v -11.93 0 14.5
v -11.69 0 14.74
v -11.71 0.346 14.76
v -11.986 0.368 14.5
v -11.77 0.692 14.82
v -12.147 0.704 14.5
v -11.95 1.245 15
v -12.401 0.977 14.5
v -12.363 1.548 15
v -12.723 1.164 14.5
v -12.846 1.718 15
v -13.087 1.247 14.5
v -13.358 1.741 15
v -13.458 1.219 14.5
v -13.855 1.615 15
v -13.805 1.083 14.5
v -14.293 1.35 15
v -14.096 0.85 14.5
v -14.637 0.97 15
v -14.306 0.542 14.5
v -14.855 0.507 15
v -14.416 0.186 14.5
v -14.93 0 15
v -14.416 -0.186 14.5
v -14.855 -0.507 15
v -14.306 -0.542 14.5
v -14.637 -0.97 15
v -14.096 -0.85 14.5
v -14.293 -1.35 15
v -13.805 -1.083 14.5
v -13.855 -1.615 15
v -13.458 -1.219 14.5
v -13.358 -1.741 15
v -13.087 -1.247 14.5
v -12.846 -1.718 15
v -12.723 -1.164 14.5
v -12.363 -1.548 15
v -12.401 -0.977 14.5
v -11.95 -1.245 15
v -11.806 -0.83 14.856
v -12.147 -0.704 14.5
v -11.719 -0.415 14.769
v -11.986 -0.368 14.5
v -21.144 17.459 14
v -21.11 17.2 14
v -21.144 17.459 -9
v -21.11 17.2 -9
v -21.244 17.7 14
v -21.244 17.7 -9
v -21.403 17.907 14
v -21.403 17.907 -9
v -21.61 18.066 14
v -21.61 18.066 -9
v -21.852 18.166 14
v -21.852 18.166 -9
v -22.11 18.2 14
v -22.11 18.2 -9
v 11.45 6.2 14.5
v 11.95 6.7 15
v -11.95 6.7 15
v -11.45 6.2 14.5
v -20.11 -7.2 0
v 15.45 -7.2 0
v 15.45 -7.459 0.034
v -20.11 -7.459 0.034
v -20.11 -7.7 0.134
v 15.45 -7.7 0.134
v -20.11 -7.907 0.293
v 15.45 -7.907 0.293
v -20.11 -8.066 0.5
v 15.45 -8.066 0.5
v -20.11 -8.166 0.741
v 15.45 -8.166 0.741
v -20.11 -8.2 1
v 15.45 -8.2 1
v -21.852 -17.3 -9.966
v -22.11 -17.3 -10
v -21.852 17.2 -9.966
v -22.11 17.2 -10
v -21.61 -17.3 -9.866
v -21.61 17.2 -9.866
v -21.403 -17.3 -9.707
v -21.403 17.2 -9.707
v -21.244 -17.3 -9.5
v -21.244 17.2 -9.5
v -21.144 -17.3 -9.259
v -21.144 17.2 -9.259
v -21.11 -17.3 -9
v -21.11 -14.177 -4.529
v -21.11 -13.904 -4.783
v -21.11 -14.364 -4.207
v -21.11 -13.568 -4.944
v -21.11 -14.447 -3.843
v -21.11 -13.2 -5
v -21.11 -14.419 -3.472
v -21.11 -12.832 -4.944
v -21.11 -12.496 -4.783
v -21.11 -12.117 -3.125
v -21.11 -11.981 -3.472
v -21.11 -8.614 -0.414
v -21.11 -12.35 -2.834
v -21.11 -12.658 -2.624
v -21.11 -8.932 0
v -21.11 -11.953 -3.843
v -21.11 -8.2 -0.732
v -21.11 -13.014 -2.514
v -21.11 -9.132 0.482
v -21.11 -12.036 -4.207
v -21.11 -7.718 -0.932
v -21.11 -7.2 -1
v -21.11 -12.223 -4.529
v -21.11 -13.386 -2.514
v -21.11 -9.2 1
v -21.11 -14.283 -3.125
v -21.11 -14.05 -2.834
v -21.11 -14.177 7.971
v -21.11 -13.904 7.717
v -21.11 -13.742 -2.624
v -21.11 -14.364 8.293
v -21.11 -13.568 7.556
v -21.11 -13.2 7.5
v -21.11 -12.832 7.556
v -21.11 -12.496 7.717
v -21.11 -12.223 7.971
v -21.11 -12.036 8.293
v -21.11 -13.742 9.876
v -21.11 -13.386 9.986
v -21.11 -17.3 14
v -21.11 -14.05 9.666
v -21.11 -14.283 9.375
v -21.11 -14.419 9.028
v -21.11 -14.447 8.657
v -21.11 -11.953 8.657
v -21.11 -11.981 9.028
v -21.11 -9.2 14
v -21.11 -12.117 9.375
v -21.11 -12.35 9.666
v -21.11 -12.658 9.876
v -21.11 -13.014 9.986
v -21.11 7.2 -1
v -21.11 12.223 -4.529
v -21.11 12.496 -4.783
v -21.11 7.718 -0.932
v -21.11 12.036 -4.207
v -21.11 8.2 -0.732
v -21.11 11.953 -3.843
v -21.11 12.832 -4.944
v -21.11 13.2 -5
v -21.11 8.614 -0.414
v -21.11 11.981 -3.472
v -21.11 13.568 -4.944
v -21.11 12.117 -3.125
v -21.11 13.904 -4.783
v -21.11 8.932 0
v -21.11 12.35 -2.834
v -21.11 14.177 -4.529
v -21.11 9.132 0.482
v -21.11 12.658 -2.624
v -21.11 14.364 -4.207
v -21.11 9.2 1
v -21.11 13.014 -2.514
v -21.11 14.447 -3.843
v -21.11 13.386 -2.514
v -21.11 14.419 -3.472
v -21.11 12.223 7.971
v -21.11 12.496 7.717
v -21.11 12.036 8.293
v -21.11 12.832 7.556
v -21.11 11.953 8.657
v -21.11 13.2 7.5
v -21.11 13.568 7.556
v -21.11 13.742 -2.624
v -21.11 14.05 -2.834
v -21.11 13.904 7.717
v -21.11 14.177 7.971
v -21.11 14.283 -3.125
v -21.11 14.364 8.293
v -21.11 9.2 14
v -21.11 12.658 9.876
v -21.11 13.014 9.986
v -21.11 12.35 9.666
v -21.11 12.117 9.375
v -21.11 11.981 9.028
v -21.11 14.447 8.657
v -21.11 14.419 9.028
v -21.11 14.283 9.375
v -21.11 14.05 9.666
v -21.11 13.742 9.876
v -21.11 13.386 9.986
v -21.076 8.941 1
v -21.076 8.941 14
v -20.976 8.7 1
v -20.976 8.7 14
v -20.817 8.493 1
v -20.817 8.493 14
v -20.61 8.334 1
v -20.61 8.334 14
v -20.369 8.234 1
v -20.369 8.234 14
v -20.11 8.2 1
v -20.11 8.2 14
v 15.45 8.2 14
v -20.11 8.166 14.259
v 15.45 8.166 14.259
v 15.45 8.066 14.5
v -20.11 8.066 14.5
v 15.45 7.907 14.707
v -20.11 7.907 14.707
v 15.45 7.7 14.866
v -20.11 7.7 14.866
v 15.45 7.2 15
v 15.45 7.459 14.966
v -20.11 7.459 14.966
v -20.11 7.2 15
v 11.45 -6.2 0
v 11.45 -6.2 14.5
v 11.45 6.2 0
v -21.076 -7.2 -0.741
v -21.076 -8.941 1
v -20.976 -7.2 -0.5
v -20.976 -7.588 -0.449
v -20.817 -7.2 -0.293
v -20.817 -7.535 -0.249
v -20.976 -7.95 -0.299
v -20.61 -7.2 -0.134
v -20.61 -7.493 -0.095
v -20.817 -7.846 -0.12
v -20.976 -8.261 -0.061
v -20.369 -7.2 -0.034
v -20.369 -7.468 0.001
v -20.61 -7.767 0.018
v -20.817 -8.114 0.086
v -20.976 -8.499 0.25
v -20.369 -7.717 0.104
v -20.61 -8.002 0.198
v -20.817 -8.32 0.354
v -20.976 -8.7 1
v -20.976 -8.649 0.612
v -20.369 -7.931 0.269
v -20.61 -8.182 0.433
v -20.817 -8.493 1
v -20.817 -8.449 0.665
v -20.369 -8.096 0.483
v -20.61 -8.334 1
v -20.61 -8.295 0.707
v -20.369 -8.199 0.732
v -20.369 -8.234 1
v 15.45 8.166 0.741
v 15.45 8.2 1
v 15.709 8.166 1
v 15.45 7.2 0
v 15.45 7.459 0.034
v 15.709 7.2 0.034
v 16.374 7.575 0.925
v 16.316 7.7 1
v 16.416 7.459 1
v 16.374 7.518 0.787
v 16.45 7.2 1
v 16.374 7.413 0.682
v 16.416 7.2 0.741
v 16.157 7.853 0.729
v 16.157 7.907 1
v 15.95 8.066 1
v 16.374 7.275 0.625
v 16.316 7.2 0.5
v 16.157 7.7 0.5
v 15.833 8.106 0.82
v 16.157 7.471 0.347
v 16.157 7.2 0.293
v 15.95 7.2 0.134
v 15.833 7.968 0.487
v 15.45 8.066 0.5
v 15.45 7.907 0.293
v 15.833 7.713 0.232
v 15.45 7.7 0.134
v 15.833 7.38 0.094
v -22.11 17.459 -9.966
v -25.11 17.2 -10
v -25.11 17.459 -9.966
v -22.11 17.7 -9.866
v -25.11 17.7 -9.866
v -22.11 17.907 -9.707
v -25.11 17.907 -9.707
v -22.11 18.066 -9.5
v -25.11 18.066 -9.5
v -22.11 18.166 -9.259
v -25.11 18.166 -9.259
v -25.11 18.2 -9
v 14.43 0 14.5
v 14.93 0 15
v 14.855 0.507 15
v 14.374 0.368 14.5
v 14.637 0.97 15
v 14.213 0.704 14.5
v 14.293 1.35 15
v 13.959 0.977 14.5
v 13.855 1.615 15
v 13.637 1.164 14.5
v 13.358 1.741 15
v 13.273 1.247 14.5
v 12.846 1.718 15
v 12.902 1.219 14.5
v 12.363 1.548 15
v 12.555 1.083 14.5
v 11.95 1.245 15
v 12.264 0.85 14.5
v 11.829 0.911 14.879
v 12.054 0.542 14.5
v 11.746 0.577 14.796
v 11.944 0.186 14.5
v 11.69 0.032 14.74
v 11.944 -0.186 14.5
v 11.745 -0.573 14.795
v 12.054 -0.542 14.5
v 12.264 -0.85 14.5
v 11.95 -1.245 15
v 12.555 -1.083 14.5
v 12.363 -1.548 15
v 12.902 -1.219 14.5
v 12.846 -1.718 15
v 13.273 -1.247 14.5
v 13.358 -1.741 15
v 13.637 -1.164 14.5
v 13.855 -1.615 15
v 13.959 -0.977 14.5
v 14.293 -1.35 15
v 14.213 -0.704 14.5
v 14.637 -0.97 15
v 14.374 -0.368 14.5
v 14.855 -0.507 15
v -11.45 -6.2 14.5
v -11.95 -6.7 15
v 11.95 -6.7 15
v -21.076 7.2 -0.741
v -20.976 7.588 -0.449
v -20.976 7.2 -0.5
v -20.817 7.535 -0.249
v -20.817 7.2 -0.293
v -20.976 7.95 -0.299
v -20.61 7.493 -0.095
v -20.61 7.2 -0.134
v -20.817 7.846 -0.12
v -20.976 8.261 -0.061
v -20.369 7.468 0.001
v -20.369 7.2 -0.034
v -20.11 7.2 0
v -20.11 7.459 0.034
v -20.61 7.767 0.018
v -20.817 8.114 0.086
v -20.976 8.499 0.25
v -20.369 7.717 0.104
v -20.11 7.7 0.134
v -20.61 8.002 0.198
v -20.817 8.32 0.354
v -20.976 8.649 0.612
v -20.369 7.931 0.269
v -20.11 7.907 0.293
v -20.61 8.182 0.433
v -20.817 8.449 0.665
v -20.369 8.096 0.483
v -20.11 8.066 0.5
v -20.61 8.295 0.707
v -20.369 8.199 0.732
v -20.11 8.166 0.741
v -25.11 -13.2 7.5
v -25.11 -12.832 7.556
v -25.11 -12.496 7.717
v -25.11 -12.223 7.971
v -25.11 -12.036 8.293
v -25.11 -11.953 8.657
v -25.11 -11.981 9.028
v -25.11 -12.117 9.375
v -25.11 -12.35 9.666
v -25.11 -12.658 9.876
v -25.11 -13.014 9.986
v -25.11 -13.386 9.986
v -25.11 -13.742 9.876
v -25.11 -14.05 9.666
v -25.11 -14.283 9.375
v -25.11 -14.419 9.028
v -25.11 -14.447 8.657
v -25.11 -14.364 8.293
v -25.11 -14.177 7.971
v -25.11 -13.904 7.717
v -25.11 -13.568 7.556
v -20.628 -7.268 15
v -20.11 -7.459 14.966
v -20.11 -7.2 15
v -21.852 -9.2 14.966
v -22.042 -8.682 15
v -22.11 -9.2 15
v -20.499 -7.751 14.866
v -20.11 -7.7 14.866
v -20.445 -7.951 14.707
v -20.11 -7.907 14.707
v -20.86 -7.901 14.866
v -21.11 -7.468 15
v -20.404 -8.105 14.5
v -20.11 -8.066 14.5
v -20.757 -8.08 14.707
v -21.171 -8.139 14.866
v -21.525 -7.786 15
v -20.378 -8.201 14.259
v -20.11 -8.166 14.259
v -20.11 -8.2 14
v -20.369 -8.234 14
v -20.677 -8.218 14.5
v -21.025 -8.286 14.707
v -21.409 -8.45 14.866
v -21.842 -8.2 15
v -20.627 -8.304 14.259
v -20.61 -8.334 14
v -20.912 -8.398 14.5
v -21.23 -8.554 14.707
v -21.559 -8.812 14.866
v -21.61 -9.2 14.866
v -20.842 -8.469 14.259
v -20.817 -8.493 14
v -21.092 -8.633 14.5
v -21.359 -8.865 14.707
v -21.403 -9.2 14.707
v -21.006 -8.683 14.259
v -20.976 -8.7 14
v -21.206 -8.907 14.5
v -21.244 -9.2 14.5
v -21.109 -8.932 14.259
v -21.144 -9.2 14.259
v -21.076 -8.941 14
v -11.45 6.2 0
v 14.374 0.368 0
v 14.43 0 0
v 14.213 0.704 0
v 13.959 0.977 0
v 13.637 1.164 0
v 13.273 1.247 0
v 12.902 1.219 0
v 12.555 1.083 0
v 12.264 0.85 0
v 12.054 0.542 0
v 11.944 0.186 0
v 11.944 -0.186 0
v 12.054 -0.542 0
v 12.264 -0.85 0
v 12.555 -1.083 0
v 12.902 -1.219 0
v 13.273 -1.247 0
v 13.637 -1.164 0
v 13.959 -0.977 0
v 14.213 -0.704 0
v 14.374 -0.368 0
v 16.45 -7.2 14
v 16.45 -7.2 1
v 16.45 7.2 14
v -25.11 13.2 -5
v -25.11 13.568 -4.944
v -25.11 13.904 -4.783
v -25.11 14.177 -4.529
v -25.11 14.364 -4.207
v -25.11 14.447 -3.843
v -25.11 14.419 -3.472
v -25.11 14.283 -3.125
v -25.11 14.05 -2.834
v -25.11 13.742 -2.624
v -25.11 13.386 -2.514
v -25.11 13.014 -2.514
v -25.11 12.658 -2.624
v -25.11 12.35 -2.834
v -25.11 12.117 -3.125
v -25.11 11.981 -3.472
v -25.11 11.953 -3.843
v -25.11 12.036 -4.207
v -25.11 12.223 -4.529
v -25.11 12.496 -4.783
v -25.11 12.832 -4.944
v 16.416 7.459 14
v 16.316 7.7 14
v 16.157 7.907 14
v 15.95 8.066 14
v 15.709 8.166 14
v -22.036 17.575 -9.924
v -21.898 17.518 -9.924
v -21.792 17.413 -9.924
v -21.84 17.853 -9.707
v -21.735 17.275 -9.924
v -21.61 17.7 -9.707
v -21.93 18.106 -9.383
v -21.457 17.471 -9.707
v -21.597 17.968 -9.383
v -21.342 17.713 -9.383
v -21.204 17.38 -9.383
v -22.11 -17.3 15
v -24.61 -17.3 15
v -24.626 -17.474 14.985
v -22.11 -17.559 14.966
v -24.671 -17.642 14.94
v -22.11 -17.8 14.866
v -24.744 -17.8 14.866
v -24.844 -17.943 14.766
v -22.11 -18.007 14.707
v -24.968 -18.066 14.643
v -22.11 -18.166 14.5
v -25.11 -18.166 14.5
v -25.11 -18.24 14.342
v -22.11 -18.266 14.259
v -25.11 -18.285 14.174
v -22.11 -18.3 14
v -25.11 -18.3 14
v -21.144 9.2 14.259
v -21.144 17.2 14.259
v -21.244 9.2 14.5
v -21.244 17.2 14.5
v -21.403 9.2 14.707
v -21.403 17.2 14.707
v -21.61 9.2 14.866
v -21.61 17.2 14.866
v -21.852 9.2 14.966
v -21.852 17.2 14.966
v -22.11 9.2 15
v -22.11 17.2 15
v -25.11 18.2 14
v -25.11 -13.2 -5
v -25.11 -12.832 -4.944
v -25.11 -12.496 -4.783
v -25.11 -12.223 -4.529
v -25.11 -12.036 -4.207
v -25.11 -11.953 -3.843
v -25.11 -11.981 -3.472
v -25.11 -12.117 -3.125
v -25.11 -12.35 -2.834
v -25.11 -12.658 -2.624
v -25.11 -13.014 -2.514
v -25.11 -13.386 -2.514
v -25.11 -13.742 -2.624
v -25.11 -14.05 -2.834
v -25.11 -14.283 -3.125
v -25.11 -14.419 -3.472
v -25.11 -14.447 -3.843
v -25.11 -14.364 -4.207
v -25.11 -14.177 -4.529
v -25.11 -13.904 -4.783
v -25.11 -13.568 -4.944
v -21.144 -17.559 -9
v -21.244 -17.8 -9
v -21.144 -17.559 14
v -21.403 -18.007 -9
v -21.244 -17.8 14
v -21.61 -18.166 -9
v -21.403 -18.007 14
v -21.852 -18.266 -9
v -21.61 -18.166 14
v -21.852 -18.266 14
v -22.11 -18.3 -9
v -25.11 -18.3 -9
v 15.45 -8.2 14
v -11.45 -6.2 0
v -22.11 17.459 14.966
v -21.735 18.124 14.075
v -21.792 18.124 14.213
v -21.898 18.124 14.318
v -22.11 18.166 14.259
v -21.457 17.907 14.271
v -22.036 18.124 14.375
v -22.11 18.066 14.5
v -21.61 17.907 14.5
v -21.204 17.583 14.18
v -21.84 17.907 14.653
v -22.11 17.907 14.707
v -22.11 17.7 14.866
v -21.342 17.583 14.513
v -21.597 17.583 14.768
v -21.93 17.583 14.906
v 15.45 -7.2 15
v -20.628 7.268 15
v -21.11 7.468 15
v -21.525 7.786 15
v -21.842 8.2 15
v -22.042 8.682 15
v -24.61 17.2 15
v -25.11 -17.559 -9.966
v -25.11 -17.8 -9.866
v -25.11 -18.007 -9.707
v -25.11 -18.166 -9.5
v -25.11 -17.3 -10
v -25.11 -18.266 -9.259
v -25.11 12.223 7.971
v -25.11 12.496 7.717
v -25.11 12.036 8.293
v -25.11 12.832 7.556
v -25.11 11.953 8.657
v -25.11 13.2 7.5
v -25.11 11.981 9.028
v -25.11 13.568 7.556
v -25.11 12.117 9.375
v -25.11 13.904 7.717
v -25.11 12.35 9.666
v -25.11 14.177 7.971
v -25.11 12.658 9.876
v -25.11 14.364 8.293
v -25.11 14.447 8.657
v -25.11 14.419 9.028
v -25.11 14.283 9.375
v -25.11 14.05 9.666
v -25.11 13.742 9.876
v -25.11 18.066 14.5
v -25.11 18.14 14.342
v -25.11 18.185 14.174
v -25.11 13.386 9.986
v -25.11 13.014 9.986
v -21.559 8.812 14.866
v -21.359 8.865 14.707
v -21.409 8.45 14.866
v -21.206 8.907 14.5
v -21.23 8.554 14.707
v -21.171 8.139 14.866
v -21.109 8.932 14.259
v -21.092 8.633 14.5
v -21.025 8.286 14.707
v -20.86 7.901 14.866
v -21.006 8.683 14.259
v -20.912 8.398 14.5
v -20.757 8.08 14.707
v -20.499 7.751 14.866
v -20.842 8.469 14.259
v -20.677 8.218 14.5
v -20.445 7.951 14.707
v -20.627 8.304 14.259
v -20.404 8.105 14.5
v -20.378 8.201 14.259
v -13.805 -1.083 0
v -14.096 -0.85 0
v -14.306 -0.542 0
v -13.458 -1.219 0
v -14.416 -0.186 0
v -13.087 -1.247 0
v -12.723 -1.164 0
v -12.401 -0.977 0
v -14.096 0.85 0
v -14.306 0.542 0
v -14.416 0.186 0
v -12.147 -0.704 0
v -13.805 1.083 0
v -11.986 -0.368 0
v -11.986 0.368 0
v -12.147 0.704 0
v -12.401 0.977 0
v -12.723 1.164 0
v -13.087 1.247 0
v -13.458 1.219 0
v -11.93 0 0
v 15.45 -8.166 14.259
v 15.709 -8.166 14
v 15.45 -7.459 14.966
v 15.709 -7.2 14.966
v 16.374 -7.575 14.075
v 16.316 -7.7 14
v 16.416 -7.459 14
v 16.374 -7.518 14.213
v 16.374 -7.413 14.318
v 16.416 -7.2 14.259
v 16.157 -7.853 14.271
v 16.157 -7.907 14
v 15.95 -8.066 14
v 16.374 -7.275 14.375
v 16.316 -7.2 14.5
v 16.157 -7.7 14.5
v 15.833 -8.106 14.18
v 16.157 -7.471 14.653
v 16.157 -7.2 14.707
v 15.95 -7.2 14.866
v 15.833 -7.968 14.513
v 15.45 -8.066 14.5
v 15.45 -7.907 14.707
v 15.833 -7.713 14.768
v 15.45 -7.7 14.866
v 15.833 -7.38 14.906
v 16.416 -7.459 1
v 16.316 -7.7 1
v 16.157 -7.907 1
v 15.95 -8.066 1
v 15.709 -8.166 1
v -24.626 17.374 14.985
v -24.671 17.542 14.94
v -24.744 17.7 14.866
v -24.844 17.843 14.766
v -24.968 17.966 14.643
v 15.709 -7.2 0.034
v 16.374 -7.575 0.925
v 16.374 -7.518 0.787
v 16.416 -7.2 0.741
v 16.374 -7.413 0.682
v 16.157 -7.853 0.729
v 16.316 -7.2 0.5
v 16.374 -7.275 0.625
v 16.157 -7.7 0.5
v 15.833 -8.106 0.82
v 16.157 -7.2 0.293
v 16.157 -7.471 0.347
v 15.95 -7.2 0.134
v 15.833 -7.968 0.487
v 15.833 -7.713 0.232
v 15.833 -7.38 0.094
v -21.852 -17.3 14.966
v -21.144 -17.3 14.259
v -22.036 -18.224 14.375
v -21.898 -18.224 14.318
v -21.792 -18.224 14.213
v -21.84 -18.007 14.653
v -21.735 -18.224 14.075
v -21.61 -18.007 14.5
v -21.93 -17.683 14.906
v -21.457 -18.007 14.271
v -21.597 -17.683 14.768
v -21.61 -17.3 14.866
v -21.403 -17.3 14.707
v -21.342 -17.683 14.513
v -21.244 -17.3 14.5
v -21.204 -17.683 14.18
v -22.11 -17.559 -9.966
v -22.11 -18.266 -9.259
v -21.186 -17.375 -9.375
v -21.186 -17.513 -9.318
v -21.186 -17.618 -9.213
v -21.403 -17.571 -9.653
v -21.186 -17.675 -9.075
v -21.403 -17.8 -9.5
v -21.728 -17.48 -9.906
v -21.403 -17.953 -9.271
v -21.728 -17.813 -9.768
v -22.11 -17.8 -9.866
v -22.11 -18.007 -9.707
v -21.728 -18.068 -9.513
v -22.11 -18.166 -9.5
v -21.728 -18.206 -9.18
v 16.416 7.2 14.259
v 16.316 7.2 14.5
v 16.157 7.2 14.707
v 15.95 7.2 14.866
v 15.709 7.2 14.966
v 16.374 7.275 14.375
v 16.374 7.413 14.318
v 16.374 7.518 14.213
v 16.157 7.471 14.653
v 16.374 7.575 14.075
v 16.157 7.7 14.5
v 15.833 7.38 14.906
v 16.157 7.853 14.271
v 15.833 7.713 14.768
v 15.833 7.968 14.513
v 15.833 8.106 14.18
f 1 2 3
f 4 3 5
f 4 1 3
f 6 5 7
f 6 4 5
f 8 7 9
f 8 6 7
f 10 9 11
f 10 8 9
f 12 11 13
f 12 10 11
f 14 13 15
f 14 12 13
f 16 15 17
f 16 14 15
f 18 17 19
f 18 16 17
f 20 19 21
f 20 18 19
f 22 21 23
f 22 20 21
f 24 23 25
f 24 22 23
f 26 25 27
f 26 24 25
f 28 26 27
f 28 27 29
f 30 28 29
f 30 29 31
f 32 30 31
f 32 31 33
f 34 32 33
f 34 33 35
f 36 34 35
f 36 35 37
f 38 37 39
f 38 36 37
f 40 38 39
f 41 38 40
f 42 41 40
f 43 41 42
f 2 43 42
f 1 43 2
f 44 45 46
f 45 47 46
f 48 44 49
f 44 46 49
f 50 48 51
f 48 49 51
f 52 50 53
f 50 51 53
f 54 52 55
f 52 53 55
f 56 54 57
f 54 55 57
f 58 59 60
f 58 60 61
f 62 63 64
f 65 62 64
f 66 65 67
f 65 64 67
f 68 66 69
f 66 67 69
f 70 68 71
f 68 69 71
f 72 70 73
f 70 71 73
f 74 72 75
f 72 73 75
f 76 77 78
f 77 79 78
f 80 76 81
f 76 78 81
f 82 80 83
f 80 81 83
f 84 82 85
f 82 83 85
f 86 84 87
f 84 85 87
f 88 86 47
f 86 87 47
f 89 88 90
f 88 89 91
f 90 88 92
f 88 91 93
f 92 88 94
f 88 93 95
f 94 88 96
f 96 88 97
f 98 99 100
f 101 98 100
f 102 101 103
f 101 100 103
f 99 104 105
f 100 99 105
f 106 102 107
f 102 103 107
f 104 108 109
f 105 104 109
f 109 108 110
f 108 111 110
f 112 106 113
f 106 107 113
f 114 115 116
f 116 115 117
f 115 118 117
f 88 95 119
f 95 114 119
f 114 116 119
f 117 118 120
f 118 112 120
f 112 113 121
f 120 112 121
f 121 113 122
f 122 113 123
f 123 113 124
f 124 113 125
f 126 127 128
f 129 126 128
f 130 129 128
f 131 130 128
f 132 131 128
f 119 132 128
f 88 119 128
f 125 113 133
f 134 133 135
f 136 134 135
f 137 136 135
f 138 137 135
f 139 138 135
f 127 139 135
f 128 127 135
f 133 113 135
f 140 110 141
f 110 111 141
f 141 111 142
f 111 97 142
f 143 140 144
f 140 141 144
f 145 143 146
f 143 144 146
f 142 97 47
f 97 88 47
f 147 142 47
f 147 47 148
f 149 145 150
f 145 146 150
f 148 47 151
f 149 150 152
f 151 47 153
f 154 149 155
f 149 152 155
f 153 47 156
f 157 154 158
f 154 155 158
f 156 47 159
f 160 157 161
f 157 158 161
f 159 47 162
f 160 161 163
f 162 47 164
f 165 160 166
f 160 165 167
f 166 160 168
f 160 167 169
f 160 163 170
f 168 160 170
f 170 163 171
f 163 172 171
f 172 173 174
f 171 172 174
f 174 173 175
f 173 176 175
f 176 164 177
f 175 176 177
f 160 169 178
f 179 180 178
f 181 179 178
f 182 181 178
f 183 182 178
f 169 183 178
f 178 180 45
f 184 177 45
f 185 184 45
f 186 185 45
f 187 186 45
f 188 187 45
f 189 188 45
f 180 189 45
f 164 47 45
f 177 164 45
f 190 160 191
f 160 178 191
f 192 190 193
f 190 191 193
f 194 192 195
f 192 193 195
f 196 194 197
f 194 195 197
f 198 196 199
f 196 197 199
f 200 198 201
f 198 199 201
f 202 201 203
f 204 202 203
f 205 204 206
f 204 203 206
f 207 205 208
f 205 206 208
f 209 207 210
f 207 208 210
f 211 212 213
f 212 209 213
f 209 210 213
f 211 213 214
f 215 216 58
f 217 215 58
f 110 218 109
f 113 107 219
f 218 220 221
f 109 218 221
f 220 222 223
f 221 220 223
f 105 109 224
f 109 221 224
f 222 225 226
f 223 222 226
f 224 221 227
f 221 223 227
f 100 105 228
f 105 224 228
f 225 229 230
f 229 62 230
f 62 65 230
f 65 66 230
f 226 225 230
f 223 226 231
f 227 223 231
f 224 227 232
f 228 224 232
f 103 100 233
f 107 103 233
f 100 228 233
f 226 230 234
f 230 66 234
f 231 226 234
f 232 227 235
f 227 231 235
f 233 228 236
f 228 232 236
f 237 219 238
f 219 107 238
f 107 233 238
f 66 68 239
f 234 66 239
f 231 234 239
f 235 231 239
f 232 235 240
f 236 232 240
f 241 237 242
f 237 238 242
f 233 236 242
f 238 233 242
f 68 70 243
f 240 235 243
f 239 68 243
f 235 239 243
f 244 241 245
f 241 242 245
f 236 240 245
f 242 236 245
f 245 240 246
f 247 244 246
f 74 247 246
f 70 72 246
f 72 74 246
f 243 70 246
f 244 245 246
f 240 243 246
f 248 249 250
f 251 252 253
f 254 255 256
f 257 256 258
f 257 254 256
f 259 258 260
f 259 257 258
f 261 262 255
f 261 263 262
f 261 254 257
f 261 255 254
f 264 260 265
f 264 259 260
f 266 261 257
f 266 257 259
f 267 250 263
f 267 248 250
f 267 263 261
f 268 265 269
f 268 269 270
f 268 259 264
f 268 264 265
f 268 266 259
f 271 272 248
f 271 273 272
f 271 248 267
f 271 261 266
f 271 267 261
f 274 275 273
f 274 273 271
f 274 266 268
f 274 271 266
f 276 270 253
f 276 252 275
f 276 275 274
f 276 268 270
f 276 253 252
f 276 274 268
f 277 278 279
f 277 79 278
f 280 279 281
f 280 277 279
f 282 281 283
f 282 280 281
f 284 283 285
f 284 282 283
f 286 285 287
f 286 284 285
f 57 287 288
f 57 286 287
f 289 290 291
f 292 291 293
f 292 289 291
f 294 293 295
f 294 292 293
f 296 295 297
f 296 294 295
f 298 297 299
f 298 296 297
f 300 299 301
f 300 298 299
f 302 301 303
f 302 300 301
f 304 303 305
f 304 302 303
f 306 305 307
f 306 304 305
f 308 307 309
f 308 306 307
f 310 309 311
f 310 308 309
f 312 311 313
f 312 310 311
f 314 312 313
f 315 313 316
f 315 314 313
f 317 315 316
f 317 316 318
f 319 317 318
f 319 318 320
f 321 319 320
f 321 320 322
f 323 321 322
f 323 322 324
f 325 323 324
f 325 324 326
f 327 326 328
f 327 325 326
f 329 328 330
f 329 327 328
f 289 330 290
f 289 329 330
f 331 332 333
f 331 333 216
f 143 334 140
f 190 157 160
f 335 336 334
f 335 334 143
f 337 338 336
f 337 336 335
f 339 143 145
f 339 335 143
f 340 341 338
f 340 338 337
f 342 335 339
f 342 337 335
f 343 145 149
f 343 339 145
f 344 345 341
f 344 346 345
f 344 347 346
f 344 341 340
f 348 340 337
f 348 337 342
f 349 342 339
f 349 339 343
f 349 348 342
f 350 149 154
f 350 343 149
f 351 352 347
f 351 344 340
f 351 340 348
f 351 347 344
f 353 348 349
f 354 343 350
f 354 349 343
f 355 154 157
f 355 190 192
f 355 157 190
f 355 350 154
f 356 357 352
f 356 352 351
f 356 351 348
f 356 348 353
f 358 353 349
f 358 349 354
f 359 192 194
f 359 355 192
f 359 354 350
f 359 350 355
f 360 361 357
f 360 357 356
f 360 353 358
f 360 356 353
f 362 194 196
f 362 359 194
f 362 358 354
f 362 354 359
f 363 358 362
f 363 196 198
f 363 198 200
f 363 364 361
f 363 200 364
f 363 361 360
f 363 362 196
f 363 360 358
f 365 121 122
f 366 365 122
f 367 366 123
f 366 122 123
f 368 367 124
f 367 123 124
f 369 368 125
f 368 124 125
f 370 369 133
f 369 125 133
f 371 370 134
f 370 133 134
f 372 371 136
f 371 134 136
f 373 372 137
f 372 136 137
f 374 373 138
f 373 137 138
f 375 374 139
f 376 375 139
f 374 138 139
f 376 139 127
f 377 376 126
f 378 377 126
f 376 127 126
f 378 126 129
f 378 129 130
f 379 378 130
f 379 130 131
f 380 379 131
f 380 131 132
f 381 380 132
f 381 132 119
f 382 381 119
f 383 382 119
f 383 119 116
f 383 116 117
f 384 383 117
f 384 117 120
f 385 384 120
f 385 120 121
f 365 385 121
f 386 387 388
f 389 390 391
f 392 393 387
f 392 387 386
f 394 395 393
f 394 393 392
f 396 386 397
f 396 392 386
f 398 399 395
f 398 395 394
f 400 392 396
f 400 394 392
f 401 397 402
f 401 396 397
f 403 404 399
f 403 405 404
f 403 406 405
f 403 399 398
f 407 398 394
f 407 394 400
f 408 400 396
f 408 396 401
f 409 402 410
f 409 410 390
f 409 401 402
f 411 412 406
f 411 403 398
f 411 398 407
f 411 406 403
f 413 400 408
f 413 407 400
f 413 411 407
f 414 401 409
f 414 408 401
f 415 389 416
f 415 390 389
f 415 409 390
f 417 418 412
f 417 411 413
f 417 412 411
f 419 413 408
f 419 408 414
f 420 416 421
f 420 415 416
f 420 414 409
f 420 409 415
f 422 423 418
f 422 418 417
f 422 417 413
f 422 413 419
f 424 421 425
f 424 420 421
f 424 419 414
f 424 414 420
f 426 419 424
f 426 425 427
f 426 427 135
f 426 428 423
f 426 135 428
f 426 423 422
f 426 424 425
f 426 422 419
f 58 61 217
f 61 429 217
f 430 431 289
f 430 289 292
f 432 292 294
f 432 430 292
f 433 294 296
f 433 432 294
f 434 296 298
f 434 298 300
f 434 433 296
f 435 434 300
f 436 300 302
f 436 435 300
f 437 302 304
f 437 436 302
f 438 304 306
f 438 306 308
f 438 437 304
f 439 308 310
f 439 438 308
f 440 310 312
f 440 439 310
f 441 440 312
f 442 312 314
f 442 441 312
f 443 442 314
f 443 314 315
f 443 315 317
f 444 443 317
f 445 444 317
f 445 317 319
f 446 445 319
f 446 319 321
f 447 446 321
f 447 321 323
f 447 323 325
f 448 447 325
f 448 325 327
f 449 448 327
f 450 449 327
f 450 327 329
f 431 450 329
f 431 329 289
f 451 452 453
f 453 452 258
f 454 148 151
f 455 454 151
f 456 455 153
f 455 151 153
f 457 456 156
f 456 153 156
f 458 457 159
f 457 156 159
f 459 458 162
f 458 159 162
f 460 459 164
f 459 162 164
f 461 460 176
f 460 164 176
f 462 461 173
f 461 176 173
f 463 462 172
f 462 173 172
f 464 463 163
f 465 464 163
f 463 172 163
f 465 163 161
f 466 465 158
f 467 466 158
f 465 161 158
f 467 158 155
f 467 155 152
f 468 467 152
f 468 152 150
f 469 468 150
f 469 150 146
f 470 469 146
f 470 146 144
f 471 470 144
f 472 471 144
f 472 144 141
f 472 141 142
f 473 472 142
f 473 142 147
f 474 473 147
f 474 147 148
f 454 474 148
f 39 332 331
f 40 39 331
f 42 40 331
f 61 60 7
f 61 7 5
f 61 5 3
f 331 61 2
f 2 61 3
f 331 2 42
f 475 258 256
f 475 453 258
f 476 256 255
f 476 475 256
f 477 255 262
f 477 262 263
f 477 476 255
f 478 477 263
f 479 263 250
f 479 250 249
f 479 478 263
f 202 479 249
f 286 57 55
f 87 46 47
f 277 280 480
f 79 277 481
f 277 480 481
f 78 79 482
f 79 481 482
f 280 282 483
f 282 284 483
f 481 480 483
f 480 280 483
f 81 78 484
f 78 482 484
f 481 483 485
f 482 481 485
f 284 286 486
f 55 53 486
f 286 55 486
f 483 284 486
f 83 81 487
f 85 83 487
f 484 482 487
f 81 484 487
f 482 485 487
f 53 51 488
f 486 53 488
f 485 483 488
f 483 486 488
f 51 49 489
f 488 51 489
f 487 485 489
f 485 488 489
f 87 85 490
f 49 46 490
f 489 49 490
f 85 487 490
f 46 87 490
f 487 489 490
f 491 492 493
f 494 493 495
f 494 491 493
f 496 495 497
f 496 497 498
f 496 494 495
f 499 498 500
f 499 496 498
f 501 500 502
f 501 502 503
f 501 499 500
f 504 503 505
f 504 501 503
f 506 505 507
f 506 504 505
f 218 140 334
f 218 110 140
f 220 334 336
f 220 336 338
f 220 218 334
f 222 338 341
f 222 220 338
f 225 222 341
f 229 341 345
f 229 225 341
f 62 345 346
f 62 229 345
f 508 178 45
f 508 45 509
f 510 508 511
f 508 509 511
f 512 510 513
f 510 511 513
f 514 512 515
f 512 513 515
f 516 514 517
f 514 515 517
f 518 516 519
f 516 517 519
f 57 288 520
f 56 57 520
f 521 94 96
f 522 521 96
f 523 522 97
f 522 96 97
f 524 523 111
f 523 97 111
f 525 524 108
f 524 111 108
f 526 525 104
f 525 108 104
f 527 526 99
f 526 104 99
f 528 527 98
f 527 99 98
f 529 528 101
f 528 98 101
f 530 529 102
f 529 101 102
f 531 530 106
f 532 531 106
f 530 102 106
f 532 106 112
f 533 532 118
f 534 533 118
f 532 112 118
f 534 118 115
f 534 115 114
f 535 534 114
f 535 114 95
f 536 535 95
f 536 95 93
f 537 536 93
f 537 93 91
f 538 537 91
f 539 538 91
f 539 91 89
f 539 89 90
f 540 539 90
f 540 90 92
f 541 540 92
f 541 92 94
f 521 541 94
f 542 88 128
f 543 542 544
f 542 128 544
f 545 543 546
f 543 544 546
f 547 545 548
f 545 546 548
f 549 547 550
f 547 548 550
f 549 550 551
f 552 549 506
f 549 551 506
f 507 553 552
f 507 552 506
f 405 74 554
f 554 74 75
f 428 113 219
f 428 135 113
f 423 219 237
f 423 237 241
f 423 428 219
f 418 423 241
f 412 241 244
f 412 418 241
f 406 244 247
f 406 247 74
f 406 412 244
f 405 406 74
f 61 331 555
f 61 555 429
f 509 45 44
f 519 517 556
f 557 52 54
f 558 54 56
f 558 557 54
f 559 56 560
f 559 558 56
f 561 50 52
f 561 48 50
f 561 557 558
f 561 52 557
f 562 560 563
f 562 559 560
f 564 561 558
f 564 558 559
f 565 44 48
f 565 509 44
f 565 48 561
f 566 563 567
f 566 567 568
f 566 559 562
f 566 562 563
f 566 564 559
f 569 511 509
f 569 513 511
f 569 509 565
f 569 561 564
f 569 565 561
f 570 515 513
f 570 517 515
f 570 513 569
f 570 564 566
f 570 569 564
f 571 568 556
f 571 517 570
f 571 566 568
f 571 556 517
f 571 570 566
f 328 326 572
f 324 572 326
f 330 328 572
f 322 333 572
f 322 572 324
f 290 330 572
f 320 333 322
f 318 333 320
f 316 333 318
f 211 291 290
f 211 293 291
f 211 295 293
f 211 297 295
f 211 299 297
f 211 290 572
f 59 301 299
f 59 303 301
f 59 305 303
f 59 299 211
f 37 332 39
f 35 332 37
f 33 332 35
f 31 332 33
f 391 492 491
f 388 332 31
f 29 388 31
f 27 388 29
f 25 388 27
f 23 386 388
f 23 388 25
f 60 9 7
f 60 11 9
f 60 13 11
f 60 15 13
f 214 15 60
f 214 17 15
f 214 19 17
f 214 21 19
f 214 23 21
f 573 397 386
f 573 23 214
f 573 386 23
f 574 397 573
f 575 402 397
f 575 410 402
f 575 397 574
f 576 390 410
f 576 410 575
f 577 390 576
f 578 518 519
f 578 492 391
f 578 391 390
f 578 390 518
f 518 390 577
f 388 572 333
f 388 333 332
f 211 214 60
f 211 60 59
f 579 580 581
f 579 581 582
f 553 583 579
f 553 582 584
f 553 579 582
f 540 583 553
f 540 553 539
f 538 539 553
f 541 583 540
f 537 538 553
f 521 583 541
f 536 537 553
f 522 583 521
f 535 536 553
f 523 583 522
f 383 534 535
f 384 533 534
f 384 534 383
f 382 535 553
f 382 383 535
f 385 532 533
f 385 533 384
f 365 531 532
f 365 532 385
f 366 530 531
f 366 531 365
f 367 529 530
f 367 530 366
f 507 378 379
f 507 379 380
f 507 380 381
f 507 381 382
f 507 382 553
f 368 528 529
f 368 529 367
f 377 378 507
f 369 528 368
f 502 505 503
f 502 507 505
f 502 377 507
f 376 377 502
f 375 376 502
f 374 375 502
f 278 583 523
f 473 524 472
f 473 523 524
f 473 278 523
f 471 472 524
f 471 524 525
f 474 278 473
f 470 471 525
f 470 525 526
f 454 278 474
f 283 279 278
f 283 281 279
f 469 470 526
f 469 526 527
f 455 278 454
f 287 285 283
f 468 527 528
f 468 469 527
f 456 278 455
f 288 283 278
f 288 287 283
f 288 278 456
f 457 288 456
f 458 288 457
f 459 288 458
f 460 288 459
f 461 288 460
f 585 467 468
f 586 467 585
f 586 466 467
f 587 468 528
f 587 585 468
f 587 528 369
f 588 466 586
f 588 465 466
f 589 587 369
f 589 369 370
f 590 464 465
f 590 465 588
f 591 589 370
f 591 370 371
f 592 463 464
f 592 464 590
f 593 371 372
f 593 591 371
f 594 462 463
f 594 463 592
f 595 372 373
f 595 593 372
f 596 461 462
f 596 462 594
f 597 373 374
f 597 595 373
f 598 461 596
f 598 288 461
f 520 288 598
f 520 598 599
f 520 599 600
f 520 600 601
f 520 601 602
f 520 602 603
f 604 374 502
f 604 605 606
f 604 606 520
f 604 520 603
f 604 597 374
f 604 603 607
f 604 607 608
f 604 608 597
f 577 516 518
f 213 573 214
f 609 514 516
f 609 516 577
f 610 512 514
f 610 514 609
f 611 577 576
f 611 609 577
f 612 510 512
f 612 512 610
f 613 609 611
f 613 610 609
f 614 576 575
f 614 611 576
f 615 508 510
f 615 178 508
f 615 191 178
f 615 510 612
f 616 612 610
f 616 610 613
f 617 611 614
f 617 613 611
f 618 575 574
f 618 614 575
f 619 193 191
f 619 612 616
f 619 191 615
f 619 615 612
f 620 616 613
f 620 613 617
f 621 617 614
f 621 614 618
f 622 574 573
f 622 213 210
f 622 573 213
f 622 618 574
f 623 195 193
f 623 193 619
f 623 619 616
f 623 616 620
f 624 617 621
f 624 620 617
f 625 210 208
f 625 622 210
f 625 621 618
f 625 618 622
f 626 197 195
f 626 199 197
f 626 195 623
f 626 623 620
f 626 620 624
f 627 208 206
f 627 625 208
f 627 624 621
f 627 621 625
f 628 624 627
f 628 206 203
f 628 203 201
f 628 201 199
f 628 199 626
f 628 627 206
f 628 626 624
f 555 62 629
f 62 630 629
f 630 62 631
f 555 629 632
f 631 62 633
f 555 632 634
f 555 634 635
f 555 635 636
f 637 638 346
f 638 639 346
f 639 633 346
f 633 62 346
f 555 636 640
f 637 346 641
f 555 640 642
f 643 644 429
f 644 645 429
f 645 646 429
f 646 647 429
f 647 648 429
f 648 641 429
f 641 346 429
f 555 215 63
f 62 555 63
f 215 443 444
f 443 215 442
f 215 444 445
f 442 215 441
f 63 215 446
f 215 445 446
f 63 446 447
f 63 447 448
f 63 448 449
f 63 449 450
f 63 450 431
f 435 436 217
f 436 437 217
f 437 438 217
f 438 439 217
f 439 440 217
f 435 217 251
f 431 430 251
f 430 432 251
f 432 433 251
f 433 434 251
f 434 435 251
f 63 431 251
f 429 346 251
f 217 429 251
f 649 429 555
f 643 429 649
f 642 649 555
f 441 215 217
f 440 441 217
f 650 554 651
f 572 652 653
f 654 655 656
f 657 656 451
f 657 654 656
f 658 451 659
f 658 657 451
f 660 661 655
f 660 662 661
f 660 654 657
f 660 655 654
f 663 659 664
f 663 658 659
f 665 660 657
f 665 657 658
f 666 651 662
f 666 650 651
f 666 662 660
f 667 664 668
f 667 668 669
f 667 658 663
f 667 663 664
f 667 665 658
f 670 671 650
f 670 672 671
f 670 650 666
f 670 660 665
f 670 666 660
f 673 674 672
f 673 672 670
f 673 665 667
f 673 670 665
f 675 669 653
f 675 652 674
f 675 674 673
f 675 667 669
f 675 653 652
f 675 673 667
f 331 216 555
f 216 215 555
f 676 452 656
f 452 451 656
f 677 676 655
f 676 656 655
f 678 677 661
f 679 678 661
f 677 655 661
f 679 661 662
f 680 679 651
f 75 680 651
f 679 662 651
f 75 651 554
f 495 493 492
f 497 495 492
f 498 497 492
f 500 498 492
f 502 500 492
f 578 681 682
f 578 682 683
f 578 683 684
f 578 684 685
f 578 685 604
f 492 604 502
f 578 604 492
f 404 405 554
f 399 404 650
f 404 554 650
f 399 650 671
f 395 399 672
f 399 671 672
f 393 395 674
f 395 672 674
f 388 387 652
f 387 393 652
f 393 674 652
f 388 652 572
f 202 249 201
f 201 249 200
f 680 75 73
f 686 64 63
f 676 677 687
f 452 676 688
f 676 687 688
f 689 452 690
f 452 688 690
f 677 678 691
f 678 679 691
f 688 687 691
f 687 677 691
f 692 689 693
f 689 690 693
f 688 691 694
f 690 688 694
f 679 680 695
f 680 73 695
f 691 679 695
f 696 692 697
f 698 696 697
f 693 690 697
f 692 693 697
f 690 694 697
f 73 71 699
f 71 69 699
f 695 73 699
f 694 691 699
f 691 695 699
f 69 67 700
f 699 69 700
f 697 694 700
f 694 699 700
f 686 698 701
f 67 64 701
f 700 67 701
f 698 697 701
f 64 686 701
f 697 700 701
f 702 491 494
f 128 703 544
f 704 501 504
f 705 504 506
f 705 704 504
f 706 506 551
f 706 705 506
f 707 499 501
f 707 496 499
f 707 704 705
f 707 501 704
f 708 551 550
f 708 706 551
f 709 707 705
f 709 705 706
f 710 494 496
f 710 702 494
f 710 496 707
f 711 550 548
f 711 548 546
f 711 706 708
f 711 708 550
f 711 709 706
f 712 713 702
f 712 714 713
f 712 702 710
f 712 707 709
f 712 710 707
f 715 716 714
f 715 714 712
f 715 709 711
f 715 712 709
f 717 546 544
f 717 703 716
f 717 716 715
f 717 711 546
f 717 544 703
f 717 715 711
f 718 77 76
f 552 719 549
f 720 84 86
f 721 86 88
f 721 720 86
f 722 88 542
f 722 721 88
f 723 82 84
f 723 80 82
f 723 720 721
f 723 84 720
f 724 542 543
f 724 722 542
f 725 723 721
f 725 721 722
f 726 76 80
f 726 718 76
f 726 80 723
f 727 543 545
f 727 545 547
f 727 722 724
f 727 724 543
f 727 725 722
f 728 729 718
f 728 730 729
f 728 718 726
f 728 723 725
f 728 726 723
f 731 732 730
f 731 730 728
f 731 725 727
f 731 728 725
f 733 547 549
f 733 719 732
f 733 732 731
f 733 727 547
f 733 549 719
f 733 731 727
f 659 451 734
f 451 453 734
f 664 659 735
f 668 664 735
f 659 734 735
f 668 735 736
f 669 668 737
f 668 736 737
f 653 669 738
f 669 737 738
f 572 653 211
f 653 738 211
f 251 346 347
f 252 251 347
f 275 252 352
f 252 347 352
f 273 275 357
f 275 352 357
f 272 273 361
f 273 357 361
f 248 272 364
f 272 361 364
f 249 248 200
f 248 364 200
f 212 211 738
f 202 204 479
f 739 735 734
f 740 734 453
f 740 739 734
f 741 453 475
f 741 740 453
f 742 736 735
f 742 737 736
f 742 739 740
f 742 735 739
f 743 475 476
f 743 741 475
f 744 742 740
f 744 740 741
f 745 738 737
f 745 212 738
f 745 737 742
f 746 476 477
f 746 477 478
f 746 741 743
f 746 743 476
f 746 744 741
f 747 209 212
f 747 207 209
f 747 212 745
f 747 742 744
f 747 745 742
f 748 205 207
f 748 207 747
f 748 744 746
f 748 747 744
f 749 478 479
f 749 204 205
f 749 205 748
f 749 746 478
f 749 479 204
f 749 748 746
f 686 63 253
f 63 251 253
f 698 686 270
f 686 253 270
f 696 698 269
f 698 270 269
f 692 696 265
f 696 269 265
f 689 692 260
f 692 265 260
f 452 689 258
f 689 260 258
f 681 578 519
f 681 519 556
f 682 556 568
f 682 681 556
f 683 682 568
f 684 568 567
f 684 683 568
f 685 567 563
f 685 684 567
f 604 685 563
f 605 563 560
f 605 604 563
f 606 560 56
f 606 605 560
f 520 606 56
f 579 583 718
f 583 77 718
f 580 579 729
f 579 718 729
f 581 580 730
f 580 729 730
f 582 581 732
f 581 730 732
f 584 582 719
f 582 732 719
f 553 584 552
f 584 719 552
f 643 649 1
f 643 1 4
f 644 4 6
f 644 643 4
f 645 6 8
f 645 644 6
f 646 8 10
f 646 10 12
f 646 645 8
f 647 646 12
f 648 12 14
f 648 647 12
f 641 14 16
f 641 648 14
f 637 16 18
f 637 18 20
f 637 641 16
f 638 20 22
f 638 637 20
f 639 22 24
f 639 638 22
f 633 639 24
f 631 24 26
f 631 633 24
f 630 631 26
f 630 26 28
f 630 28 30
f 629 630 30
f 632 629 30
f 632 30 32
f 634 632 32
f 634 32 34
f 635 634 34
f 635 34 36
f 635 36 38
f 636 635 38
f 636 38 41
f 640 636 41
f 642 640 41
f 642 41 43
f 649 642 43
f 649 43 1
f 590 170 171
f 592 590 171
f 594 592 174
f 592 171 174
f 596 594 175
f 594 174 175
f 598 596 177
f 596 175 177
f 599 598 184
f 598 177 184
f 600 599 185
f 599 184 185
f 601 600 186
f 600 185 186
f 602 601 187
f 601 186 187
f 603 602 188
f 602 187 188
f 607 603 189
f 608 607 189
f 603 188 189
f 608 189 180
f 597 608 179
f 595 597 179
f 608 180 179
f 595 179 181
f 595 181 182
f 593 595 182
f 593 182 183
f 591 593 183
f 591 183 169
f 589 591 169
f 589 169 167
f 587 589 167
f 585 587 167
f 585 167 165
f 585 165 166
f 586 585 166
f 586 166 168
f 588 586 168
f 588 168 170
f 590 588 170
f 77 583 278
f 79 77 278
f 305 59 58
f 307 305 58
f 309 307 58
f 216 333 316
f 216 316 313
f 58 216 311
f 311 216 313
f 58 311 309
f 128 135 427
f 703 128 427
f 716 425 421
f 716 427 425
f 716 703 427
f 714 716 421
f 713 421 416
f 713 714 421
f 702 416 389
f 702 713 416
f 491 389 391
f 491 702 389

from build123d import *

# Parameters (mm, degrees)
SKETCH1_R           = 1.25
SKETCH1_W           = 22.9
SKETCH1_H           = 12.4
BOSS_EXTRUDE1_DEPTH = 15
SKETCH4_W           = 25
SKETCH4_H           = 36.5
BOSS_EXTRUDE2_DEPTH = 4
SKETCH3_R           = 1.25
CUT_EXTRUDE1_DEPTH  = 35.502452959
CHAMFER1_SIZE       = 0.5
FILLET1_R           = 1


with BuildPart() as part:
    # Sketch1 → Boss-Extrude1 (new body)
    with BuildSketch(Plane.XY):
        Polygon((16.45, -8.2), (16.45, 8.2), (-21.110341698, 8.2), (-21.110341698, 18.2), (-25.110341698, 18.2), (-25.110341698, -18.2), (-21.110341698, -18.2), (-21.110341698, -8.2), align=None)
        with Locations((13.18, 0)):
            Circle(SKETCH1_R, mode=Mode.SUBTRACT)
        with Locations((-13.18, 0)):
            Circle(SKETCH1_R, mode=Mode.SUBTRACT)
        Rectangle(SKETCH1_W, SKETCH1_H, mode=Mode.SUBTRACT)
    extrude(amount=BOSS_EXTRUDE1_DEPTH)

    # Sketch4 → Boss-Extrude2 (add)
    with BuildSketch(Plane.ZY.offset(25.110341698)):
        with Locations((2.5, -0.05)):
            Rectangle(SKETCH4_W, SKETCH4_H)
    extrude(amount=-BOSS_EXTRUDE2_DEPTH)

    # Sketch3 → Cut-Extrude1 (cut, through all)
    with BuildSketch(Plane(origin=(0, 0, 0), x_dir=(0, 0, -1), z_dir=(1, 0, 0))):
        with Locations((-8.75, 13.2)):
            Circle(SKETCH3_R)
        with Locations((3.75, 13.2)):
            Circle(SKETCH3_R)
        with Locations((3.75, -13.2)):
            Circle(SKETCH3_R)
        with Locations((-8.75, -13.2)):
            Circle(SKETCH3_R)
    extrude(amount=-CUT_EXTRUDE1_DEPTH, mode=Mode.SUBTRACT)

    # Chamfer1
    # the kernel refuses this chamfer: 0.5 mm, written as the material it takes off along each edge
    with BuildSketch(Plane(origin=(-25.110341698, 19.485841494, 15), x_dir=(0.9996219169112968, 0, 0.02749587661058555), z_dir=(0, -1, 0))) as chamfer1_piece_1:
        Polygon((CHAMFER1_SIZE * 0.999621916911, -CHAMFER1_SIZE * 0.0274958766106), (-CHAMFER1_SIZE * 0.0274958766106, -CHAMFER1_SIZE * 0.999621916911), (0, 0), align=None)
    extrude(amount=39.071682988, mode=Mode.SUBTRACT)
    with BuildSketch(Plane(origin=(11.45, -6.2, 15), x_dir=(0.9996219169112968, 0, 0.02749587661058574), z_dir=(0, 1, 0)), Plane(origin=(-11.45, 6.2, 15), x_dir=(-0.9996219169112968, 0, 0.027495876610585647), z_dir=(0, -1, 0))) as chamfer1_piece_2:
        Polygon((CHAMFER1_SIZE * 0.999621916911, CHAMFER1_SIZE * 0.0274958766106), (-CHAMFER1_SIZE * 0.0274958766106, CHAMFER1_SIZE * 0.999621916911), (0, 0), align=None)
    extrude(amount=12.4, mode=Mode.SUBTRACT)
    with BuildSketch(Plane(origin=(11.45, 6.2, 15), x_dir=(0, 0.9996219169112968, 0.027495876610585647), z_dir=(-1, 0, 0)), Plane(origin=(-11.45, -6.2, 15), x_dir=(0, -0.9996219169112968, 0.027495876610585647), z_dir=(1, 0, 0))) as chamfer1_piece_3:
        Polygon((CHAMFER1_SIZE * 0.999621916911, CHAMFER1_SIZE * 0.0274958766106), (-CHAMFER1_SIZE * 0.0274958766106, CHAMFER1_SIZE * 0.999621916911), (0, 0), align=None)
    extrude(amount=22.9, mode=Mode.SUBTRACT)
    with BuildSketch(Plane(origin=(13.18, 0, 15), x_dir=(1, 0, 0), z_dir=(0, -1, 0))) as chamfer1_piece_4:
        Polygon((1.25 + CHAMFER1_SIZE, 0), (1.25, -CHAMFER1_SIZE), (1.25, 0), align=None)
    revolve(axis=Axis((13.18, 0, 15), (0, 0, 1)), mode=Mode.SUBTRACT)
    with BuildSketch(Plane(origin=(-13.18, 0, 15), x_dir=(1, 0, 0), z_dir=(0, -1, 0))) as chamfer1_piece_5:
        Polygon((1.25 + CHAMFER1_SIZE, 0), (1.25, -CHAMFER1_SIZE), (1.25, 0), align=None)
    revolve(axis=Axis((-13.18, 0, 15), (0, 0, 1)), mode=Mode.SUBTRACT)
    with BuildSketch(Plane(origin=(11.45, -7.485841494, 15), x_dir=(0.9996219169112968, 0, 0.027495876610585647), z_dir=(0, 1, 0))) as chamfer1_piece_6a_section:
        Polygon((CHAMFER1_SIZE * 0.999621916911, CHAMFER1_SIZE * 0.0274958766106), (-CHAMFER1_SIZE * 0.0274958766106, CHAMFER1_SIZE * 0.999621916911), (0, 0), align=None)
    chamfer1_piece_6a = extrude(amount=13.685841494, mode=Mode.PRIVATE)
    chamfer1_piece_6a = split(chamfer1_piece_6a, bisect_by=Plane(origin=(11.614896813, -6.2, 14.835103187), z_dir=(0, -1, 0)), keep=Keep.TOP, mode=Mode.PRIVATE)
    with BuildSketch(Plane(origin=(-11.45, -6.2, 15), x_dir=(0, -0.9996219169112968, 0.027495876610585647), z_dir=(1, 0, 0))) as chamfer1_piece_6b_section:
        Polygon((CHAMFER1_SIZE * 0.999621916911, CHAMFER1_SIZE * 0.0274958766106), (-CHAMFER1_SIZE * 0.0274958766106, CHAMFER1_SIZE * 0.999621916911), (0, 0), align=None)
    chamfer1_piece_6b = extrude(amount=24.185841494, mode=Mode.PRIVATE)
    chamfer1_piece_6b = split(chamfer1_piece_6b, bisect_by=Plane(origin=(11.45, -6.364896813, 14.835103187), z_dir=(1, 0, 0)), keep=Keep.TOP, mode=Mode.PRIVATE)
    chamfer1_piece_6 = chamfer1_piece_6a & chamfer1_piece_6b
    add(chamfer1_piece_6, mode=Mode.SUBTRACT)
    with BuildSketch(Plane(origin=(11.45, -6.2, 15), x_dir=(0.9996219169112968, 0, 0.02749587661058574), z_dir=(0, 1, 0))) as chamfer1_piece_7a_section:
        Polygon((CHAMFER1_SIZE * 0.999621916911, CHAMFER1_SIZE * 0.0274958766106), (-CHAMFER1_SIZE * 0.0274958766106, CHAMFER1_SIZE * 0.999621916911), (0, 0), align=None)
    chamfer1_piece_7a = extrude(amount=13.685841494, mode=Mode.PRIVATE)
    chamfer1_piece_7a = split(chamfer1_piece_7a, bisect_by=Plane(origin=(11.614896813, 6.2, 14.835103187), z_dir=(0, 1, 0)), keep=Keep.TOP, mode=Mode.PRIVATE)
    with BuildSketch(Plane(origin=(12.735841494, 6.2, 15), x_dir=(0, 0.9996219169112968, 0.027495876610585647), z_dir=(-1, 0, 0))) as chamfer1_piece_7b_section:
        Polygon((CHAMFER1_SIZE * 0.999621916911, CHAMFER1_SIZE * 0.0274958766106), (-CHAMFER1_SIZE * 0.0274958766106, CHAMFER1_SIZE * 0.999621916911), (0, 0), align=None)
    chamfer1_piece_7b = extrude(amount=24.185841494, mode=Mode.PRIVATE)
    chamfer1_piece_7b = split(chamfer1_piece_7b, bisect_by=Plane(origin=(11.45, 6.364896813, 14.835103187), z_dir=(1, 0, 0)), keep=Keep.TOP, mode=Mode.PRIVATE)
    chamfer1_piece_7 = chamfer1_piece_7a & chamfer1_piece_7b
    add(chamfer1_piece_7, mode=Mode.SUBTRACT)
    with BuildSketch(Plane(origin=(-11.45, 7.485841494, 15), x_dir=(-0.9996219169112968, 0, 0.027495876610585647), z_dir=(0, -1, 0))) as chamfer1_piece_8a_section:
        Polygon((CHAMFER1_SIZE * 0.999621916911, CHAMFER1_SIZE * 0.0274958766106), (-CHAMFER1_SIZE * 0.0274958766106, CHAMFER1_SIZE * 0.999621916911), (0, 0), align=None)
    chamfer1_piece_8a = extrude(amount=13.685841494, mode=Mode.PRIVATE)
    chamfer1_piece_8a = split(chamfer1_piece_8a, bisect_by=Plane(origin=(-11.614896813, 6.2, 14.835103187), z_dir=(0, 1, 0)), keep=Keep.TOP, mode=Mode.PRIVATE)
    with BuildSketch(Plane(origin=(11.45, 6.2, 15), x_dir=(0, 0.9996219169112968, 0.027495876610585647), z_dir=(-1, 0, 0))) as chamfer1_piece_8b_section:
        Polygon((CHAMFER1_SIZE * 0.999621916911, CHAMFER1_SIZE * 0.0274958766106), (-CHAMFER1_SIZE * 0.0274958766106, CHAMFER1_SIZE * 0.999621916911), (0, 0), align=None)
    chamfer1_piece_8b = extrude(amount=24.185841494, mode=Mode.PRIVATE)
    chamfer1_piece_8b = split(chamfer1_piece_8b, bisect_by=Plane(origin=(-11.45, 6.364896813, 14.835103187), z_dir=(-1, 0, 0)), keep=Keep.TOP, mode=Mode.PRIVATE)
    chamfer1_piece_8 = chamfer1_piece_8a & chamfer1_piece_8b
    add(chamfer1_piece_8, mode=Mode.SUBTRACT)
    with BuildSketch(Plane(origin=(-12.735841494, -6.2, 15), x_dir=(0, -0.9996219169112968, 0.027495876610585647), z_dir=(1, 0, 0))) as chamfer1_piece_9a_section:
        Polygon((CHAMFER1_SIZE * 0.999621916911, CHAMFER1_SIZE * 0.0274958766106), (-CHAMFER1_SIZE * 0.0274958766106, CHAMFER1_SIZE * 0.999621916911), (0, 0), align=None)
    chamfer1_piece_9a = extrude(amount=24.185841494, mode=Mode.PRIVATE)
    chamfer1_piece_9a = split(chamfer1_piece_9a, bisect_by=Plane(origin=(-11.45, -6.364896813, 14.835103187), z_dir=(-1, 0, 0)), keep=Keep.TOP, mode=Mode.PRIVATE)
    with BuildSketch(Plane(origin=(-11.45, 6.2, 15), x_dir=(-0.9996219169112968, 0, 0.027495876610585647), z_dir=(0, -1, 0))) as chamfer1_piece_9b_section:
        Polygon((CHAMFER1_SIZE * 0.999621916911, CHAMFER1_SIZE * 0.0274958766106), (-CHAMFER1_SIZE * 0.0274958766106, CHAMFER1_SIZE * 0.999621916911), (0, 0), align=None)
    chamfer1_piece_9b = extrude(amount=13.685841494, mode=Mode.PRIVATE)
    chamfer1_piece_9b = split(chamfer1_piece_9b, bisect_by=Plane(origin=(-11.614896813, -6.2, 14.835103187), z_dir=(0, -1, 0)), keep=Keep.TOP, mode=Mode.PRIVATE)
    chamfer1_piece_9 = chamfer1_piece_9a & chamfer1_piece_9b
    add(chamfer1_piece_9, mode=Mode.SUBTRACT)

    # Fillet1
    fillet1_edges = [part.edges().sort_by_distance(p)[0] for p in [
        (-21.110341698, -13.25, 15),
        (-21.110341698, 0, 0),
        (-21.110341698, 13.2, 15),
        (-21.110341698, -8.2, 7.5),
        (-2.330170849, -8.2, 15),
        (-2.330170849, -8.2, 0),
        (-2.330170849, 8.2, 15),
        (-21.110341698, 8.2, 7.5),
        (-2.330170849, 8.2, 0),
        (16.45, -8.2, 7.5),
        (16.45, 0, 15),
        (16.45, 8.2, 7.5),
        (16.45, 0, 0),
        (-21.110341698, 18.2, 2.5),
        (-22.860341698, 18.2, 15),
        (-23.110341698, -18.3, -10),
        (-23.110341698, 18.2, -10),
        (-21.110341698, -0.05, -10),
        (-22.860341698, -18.3, 15),
        (-21.110341698, -18.3, 2.5),
    ]]
    fillet(fillet1_edges, radius=FILLET1_R)


solid = part.part
